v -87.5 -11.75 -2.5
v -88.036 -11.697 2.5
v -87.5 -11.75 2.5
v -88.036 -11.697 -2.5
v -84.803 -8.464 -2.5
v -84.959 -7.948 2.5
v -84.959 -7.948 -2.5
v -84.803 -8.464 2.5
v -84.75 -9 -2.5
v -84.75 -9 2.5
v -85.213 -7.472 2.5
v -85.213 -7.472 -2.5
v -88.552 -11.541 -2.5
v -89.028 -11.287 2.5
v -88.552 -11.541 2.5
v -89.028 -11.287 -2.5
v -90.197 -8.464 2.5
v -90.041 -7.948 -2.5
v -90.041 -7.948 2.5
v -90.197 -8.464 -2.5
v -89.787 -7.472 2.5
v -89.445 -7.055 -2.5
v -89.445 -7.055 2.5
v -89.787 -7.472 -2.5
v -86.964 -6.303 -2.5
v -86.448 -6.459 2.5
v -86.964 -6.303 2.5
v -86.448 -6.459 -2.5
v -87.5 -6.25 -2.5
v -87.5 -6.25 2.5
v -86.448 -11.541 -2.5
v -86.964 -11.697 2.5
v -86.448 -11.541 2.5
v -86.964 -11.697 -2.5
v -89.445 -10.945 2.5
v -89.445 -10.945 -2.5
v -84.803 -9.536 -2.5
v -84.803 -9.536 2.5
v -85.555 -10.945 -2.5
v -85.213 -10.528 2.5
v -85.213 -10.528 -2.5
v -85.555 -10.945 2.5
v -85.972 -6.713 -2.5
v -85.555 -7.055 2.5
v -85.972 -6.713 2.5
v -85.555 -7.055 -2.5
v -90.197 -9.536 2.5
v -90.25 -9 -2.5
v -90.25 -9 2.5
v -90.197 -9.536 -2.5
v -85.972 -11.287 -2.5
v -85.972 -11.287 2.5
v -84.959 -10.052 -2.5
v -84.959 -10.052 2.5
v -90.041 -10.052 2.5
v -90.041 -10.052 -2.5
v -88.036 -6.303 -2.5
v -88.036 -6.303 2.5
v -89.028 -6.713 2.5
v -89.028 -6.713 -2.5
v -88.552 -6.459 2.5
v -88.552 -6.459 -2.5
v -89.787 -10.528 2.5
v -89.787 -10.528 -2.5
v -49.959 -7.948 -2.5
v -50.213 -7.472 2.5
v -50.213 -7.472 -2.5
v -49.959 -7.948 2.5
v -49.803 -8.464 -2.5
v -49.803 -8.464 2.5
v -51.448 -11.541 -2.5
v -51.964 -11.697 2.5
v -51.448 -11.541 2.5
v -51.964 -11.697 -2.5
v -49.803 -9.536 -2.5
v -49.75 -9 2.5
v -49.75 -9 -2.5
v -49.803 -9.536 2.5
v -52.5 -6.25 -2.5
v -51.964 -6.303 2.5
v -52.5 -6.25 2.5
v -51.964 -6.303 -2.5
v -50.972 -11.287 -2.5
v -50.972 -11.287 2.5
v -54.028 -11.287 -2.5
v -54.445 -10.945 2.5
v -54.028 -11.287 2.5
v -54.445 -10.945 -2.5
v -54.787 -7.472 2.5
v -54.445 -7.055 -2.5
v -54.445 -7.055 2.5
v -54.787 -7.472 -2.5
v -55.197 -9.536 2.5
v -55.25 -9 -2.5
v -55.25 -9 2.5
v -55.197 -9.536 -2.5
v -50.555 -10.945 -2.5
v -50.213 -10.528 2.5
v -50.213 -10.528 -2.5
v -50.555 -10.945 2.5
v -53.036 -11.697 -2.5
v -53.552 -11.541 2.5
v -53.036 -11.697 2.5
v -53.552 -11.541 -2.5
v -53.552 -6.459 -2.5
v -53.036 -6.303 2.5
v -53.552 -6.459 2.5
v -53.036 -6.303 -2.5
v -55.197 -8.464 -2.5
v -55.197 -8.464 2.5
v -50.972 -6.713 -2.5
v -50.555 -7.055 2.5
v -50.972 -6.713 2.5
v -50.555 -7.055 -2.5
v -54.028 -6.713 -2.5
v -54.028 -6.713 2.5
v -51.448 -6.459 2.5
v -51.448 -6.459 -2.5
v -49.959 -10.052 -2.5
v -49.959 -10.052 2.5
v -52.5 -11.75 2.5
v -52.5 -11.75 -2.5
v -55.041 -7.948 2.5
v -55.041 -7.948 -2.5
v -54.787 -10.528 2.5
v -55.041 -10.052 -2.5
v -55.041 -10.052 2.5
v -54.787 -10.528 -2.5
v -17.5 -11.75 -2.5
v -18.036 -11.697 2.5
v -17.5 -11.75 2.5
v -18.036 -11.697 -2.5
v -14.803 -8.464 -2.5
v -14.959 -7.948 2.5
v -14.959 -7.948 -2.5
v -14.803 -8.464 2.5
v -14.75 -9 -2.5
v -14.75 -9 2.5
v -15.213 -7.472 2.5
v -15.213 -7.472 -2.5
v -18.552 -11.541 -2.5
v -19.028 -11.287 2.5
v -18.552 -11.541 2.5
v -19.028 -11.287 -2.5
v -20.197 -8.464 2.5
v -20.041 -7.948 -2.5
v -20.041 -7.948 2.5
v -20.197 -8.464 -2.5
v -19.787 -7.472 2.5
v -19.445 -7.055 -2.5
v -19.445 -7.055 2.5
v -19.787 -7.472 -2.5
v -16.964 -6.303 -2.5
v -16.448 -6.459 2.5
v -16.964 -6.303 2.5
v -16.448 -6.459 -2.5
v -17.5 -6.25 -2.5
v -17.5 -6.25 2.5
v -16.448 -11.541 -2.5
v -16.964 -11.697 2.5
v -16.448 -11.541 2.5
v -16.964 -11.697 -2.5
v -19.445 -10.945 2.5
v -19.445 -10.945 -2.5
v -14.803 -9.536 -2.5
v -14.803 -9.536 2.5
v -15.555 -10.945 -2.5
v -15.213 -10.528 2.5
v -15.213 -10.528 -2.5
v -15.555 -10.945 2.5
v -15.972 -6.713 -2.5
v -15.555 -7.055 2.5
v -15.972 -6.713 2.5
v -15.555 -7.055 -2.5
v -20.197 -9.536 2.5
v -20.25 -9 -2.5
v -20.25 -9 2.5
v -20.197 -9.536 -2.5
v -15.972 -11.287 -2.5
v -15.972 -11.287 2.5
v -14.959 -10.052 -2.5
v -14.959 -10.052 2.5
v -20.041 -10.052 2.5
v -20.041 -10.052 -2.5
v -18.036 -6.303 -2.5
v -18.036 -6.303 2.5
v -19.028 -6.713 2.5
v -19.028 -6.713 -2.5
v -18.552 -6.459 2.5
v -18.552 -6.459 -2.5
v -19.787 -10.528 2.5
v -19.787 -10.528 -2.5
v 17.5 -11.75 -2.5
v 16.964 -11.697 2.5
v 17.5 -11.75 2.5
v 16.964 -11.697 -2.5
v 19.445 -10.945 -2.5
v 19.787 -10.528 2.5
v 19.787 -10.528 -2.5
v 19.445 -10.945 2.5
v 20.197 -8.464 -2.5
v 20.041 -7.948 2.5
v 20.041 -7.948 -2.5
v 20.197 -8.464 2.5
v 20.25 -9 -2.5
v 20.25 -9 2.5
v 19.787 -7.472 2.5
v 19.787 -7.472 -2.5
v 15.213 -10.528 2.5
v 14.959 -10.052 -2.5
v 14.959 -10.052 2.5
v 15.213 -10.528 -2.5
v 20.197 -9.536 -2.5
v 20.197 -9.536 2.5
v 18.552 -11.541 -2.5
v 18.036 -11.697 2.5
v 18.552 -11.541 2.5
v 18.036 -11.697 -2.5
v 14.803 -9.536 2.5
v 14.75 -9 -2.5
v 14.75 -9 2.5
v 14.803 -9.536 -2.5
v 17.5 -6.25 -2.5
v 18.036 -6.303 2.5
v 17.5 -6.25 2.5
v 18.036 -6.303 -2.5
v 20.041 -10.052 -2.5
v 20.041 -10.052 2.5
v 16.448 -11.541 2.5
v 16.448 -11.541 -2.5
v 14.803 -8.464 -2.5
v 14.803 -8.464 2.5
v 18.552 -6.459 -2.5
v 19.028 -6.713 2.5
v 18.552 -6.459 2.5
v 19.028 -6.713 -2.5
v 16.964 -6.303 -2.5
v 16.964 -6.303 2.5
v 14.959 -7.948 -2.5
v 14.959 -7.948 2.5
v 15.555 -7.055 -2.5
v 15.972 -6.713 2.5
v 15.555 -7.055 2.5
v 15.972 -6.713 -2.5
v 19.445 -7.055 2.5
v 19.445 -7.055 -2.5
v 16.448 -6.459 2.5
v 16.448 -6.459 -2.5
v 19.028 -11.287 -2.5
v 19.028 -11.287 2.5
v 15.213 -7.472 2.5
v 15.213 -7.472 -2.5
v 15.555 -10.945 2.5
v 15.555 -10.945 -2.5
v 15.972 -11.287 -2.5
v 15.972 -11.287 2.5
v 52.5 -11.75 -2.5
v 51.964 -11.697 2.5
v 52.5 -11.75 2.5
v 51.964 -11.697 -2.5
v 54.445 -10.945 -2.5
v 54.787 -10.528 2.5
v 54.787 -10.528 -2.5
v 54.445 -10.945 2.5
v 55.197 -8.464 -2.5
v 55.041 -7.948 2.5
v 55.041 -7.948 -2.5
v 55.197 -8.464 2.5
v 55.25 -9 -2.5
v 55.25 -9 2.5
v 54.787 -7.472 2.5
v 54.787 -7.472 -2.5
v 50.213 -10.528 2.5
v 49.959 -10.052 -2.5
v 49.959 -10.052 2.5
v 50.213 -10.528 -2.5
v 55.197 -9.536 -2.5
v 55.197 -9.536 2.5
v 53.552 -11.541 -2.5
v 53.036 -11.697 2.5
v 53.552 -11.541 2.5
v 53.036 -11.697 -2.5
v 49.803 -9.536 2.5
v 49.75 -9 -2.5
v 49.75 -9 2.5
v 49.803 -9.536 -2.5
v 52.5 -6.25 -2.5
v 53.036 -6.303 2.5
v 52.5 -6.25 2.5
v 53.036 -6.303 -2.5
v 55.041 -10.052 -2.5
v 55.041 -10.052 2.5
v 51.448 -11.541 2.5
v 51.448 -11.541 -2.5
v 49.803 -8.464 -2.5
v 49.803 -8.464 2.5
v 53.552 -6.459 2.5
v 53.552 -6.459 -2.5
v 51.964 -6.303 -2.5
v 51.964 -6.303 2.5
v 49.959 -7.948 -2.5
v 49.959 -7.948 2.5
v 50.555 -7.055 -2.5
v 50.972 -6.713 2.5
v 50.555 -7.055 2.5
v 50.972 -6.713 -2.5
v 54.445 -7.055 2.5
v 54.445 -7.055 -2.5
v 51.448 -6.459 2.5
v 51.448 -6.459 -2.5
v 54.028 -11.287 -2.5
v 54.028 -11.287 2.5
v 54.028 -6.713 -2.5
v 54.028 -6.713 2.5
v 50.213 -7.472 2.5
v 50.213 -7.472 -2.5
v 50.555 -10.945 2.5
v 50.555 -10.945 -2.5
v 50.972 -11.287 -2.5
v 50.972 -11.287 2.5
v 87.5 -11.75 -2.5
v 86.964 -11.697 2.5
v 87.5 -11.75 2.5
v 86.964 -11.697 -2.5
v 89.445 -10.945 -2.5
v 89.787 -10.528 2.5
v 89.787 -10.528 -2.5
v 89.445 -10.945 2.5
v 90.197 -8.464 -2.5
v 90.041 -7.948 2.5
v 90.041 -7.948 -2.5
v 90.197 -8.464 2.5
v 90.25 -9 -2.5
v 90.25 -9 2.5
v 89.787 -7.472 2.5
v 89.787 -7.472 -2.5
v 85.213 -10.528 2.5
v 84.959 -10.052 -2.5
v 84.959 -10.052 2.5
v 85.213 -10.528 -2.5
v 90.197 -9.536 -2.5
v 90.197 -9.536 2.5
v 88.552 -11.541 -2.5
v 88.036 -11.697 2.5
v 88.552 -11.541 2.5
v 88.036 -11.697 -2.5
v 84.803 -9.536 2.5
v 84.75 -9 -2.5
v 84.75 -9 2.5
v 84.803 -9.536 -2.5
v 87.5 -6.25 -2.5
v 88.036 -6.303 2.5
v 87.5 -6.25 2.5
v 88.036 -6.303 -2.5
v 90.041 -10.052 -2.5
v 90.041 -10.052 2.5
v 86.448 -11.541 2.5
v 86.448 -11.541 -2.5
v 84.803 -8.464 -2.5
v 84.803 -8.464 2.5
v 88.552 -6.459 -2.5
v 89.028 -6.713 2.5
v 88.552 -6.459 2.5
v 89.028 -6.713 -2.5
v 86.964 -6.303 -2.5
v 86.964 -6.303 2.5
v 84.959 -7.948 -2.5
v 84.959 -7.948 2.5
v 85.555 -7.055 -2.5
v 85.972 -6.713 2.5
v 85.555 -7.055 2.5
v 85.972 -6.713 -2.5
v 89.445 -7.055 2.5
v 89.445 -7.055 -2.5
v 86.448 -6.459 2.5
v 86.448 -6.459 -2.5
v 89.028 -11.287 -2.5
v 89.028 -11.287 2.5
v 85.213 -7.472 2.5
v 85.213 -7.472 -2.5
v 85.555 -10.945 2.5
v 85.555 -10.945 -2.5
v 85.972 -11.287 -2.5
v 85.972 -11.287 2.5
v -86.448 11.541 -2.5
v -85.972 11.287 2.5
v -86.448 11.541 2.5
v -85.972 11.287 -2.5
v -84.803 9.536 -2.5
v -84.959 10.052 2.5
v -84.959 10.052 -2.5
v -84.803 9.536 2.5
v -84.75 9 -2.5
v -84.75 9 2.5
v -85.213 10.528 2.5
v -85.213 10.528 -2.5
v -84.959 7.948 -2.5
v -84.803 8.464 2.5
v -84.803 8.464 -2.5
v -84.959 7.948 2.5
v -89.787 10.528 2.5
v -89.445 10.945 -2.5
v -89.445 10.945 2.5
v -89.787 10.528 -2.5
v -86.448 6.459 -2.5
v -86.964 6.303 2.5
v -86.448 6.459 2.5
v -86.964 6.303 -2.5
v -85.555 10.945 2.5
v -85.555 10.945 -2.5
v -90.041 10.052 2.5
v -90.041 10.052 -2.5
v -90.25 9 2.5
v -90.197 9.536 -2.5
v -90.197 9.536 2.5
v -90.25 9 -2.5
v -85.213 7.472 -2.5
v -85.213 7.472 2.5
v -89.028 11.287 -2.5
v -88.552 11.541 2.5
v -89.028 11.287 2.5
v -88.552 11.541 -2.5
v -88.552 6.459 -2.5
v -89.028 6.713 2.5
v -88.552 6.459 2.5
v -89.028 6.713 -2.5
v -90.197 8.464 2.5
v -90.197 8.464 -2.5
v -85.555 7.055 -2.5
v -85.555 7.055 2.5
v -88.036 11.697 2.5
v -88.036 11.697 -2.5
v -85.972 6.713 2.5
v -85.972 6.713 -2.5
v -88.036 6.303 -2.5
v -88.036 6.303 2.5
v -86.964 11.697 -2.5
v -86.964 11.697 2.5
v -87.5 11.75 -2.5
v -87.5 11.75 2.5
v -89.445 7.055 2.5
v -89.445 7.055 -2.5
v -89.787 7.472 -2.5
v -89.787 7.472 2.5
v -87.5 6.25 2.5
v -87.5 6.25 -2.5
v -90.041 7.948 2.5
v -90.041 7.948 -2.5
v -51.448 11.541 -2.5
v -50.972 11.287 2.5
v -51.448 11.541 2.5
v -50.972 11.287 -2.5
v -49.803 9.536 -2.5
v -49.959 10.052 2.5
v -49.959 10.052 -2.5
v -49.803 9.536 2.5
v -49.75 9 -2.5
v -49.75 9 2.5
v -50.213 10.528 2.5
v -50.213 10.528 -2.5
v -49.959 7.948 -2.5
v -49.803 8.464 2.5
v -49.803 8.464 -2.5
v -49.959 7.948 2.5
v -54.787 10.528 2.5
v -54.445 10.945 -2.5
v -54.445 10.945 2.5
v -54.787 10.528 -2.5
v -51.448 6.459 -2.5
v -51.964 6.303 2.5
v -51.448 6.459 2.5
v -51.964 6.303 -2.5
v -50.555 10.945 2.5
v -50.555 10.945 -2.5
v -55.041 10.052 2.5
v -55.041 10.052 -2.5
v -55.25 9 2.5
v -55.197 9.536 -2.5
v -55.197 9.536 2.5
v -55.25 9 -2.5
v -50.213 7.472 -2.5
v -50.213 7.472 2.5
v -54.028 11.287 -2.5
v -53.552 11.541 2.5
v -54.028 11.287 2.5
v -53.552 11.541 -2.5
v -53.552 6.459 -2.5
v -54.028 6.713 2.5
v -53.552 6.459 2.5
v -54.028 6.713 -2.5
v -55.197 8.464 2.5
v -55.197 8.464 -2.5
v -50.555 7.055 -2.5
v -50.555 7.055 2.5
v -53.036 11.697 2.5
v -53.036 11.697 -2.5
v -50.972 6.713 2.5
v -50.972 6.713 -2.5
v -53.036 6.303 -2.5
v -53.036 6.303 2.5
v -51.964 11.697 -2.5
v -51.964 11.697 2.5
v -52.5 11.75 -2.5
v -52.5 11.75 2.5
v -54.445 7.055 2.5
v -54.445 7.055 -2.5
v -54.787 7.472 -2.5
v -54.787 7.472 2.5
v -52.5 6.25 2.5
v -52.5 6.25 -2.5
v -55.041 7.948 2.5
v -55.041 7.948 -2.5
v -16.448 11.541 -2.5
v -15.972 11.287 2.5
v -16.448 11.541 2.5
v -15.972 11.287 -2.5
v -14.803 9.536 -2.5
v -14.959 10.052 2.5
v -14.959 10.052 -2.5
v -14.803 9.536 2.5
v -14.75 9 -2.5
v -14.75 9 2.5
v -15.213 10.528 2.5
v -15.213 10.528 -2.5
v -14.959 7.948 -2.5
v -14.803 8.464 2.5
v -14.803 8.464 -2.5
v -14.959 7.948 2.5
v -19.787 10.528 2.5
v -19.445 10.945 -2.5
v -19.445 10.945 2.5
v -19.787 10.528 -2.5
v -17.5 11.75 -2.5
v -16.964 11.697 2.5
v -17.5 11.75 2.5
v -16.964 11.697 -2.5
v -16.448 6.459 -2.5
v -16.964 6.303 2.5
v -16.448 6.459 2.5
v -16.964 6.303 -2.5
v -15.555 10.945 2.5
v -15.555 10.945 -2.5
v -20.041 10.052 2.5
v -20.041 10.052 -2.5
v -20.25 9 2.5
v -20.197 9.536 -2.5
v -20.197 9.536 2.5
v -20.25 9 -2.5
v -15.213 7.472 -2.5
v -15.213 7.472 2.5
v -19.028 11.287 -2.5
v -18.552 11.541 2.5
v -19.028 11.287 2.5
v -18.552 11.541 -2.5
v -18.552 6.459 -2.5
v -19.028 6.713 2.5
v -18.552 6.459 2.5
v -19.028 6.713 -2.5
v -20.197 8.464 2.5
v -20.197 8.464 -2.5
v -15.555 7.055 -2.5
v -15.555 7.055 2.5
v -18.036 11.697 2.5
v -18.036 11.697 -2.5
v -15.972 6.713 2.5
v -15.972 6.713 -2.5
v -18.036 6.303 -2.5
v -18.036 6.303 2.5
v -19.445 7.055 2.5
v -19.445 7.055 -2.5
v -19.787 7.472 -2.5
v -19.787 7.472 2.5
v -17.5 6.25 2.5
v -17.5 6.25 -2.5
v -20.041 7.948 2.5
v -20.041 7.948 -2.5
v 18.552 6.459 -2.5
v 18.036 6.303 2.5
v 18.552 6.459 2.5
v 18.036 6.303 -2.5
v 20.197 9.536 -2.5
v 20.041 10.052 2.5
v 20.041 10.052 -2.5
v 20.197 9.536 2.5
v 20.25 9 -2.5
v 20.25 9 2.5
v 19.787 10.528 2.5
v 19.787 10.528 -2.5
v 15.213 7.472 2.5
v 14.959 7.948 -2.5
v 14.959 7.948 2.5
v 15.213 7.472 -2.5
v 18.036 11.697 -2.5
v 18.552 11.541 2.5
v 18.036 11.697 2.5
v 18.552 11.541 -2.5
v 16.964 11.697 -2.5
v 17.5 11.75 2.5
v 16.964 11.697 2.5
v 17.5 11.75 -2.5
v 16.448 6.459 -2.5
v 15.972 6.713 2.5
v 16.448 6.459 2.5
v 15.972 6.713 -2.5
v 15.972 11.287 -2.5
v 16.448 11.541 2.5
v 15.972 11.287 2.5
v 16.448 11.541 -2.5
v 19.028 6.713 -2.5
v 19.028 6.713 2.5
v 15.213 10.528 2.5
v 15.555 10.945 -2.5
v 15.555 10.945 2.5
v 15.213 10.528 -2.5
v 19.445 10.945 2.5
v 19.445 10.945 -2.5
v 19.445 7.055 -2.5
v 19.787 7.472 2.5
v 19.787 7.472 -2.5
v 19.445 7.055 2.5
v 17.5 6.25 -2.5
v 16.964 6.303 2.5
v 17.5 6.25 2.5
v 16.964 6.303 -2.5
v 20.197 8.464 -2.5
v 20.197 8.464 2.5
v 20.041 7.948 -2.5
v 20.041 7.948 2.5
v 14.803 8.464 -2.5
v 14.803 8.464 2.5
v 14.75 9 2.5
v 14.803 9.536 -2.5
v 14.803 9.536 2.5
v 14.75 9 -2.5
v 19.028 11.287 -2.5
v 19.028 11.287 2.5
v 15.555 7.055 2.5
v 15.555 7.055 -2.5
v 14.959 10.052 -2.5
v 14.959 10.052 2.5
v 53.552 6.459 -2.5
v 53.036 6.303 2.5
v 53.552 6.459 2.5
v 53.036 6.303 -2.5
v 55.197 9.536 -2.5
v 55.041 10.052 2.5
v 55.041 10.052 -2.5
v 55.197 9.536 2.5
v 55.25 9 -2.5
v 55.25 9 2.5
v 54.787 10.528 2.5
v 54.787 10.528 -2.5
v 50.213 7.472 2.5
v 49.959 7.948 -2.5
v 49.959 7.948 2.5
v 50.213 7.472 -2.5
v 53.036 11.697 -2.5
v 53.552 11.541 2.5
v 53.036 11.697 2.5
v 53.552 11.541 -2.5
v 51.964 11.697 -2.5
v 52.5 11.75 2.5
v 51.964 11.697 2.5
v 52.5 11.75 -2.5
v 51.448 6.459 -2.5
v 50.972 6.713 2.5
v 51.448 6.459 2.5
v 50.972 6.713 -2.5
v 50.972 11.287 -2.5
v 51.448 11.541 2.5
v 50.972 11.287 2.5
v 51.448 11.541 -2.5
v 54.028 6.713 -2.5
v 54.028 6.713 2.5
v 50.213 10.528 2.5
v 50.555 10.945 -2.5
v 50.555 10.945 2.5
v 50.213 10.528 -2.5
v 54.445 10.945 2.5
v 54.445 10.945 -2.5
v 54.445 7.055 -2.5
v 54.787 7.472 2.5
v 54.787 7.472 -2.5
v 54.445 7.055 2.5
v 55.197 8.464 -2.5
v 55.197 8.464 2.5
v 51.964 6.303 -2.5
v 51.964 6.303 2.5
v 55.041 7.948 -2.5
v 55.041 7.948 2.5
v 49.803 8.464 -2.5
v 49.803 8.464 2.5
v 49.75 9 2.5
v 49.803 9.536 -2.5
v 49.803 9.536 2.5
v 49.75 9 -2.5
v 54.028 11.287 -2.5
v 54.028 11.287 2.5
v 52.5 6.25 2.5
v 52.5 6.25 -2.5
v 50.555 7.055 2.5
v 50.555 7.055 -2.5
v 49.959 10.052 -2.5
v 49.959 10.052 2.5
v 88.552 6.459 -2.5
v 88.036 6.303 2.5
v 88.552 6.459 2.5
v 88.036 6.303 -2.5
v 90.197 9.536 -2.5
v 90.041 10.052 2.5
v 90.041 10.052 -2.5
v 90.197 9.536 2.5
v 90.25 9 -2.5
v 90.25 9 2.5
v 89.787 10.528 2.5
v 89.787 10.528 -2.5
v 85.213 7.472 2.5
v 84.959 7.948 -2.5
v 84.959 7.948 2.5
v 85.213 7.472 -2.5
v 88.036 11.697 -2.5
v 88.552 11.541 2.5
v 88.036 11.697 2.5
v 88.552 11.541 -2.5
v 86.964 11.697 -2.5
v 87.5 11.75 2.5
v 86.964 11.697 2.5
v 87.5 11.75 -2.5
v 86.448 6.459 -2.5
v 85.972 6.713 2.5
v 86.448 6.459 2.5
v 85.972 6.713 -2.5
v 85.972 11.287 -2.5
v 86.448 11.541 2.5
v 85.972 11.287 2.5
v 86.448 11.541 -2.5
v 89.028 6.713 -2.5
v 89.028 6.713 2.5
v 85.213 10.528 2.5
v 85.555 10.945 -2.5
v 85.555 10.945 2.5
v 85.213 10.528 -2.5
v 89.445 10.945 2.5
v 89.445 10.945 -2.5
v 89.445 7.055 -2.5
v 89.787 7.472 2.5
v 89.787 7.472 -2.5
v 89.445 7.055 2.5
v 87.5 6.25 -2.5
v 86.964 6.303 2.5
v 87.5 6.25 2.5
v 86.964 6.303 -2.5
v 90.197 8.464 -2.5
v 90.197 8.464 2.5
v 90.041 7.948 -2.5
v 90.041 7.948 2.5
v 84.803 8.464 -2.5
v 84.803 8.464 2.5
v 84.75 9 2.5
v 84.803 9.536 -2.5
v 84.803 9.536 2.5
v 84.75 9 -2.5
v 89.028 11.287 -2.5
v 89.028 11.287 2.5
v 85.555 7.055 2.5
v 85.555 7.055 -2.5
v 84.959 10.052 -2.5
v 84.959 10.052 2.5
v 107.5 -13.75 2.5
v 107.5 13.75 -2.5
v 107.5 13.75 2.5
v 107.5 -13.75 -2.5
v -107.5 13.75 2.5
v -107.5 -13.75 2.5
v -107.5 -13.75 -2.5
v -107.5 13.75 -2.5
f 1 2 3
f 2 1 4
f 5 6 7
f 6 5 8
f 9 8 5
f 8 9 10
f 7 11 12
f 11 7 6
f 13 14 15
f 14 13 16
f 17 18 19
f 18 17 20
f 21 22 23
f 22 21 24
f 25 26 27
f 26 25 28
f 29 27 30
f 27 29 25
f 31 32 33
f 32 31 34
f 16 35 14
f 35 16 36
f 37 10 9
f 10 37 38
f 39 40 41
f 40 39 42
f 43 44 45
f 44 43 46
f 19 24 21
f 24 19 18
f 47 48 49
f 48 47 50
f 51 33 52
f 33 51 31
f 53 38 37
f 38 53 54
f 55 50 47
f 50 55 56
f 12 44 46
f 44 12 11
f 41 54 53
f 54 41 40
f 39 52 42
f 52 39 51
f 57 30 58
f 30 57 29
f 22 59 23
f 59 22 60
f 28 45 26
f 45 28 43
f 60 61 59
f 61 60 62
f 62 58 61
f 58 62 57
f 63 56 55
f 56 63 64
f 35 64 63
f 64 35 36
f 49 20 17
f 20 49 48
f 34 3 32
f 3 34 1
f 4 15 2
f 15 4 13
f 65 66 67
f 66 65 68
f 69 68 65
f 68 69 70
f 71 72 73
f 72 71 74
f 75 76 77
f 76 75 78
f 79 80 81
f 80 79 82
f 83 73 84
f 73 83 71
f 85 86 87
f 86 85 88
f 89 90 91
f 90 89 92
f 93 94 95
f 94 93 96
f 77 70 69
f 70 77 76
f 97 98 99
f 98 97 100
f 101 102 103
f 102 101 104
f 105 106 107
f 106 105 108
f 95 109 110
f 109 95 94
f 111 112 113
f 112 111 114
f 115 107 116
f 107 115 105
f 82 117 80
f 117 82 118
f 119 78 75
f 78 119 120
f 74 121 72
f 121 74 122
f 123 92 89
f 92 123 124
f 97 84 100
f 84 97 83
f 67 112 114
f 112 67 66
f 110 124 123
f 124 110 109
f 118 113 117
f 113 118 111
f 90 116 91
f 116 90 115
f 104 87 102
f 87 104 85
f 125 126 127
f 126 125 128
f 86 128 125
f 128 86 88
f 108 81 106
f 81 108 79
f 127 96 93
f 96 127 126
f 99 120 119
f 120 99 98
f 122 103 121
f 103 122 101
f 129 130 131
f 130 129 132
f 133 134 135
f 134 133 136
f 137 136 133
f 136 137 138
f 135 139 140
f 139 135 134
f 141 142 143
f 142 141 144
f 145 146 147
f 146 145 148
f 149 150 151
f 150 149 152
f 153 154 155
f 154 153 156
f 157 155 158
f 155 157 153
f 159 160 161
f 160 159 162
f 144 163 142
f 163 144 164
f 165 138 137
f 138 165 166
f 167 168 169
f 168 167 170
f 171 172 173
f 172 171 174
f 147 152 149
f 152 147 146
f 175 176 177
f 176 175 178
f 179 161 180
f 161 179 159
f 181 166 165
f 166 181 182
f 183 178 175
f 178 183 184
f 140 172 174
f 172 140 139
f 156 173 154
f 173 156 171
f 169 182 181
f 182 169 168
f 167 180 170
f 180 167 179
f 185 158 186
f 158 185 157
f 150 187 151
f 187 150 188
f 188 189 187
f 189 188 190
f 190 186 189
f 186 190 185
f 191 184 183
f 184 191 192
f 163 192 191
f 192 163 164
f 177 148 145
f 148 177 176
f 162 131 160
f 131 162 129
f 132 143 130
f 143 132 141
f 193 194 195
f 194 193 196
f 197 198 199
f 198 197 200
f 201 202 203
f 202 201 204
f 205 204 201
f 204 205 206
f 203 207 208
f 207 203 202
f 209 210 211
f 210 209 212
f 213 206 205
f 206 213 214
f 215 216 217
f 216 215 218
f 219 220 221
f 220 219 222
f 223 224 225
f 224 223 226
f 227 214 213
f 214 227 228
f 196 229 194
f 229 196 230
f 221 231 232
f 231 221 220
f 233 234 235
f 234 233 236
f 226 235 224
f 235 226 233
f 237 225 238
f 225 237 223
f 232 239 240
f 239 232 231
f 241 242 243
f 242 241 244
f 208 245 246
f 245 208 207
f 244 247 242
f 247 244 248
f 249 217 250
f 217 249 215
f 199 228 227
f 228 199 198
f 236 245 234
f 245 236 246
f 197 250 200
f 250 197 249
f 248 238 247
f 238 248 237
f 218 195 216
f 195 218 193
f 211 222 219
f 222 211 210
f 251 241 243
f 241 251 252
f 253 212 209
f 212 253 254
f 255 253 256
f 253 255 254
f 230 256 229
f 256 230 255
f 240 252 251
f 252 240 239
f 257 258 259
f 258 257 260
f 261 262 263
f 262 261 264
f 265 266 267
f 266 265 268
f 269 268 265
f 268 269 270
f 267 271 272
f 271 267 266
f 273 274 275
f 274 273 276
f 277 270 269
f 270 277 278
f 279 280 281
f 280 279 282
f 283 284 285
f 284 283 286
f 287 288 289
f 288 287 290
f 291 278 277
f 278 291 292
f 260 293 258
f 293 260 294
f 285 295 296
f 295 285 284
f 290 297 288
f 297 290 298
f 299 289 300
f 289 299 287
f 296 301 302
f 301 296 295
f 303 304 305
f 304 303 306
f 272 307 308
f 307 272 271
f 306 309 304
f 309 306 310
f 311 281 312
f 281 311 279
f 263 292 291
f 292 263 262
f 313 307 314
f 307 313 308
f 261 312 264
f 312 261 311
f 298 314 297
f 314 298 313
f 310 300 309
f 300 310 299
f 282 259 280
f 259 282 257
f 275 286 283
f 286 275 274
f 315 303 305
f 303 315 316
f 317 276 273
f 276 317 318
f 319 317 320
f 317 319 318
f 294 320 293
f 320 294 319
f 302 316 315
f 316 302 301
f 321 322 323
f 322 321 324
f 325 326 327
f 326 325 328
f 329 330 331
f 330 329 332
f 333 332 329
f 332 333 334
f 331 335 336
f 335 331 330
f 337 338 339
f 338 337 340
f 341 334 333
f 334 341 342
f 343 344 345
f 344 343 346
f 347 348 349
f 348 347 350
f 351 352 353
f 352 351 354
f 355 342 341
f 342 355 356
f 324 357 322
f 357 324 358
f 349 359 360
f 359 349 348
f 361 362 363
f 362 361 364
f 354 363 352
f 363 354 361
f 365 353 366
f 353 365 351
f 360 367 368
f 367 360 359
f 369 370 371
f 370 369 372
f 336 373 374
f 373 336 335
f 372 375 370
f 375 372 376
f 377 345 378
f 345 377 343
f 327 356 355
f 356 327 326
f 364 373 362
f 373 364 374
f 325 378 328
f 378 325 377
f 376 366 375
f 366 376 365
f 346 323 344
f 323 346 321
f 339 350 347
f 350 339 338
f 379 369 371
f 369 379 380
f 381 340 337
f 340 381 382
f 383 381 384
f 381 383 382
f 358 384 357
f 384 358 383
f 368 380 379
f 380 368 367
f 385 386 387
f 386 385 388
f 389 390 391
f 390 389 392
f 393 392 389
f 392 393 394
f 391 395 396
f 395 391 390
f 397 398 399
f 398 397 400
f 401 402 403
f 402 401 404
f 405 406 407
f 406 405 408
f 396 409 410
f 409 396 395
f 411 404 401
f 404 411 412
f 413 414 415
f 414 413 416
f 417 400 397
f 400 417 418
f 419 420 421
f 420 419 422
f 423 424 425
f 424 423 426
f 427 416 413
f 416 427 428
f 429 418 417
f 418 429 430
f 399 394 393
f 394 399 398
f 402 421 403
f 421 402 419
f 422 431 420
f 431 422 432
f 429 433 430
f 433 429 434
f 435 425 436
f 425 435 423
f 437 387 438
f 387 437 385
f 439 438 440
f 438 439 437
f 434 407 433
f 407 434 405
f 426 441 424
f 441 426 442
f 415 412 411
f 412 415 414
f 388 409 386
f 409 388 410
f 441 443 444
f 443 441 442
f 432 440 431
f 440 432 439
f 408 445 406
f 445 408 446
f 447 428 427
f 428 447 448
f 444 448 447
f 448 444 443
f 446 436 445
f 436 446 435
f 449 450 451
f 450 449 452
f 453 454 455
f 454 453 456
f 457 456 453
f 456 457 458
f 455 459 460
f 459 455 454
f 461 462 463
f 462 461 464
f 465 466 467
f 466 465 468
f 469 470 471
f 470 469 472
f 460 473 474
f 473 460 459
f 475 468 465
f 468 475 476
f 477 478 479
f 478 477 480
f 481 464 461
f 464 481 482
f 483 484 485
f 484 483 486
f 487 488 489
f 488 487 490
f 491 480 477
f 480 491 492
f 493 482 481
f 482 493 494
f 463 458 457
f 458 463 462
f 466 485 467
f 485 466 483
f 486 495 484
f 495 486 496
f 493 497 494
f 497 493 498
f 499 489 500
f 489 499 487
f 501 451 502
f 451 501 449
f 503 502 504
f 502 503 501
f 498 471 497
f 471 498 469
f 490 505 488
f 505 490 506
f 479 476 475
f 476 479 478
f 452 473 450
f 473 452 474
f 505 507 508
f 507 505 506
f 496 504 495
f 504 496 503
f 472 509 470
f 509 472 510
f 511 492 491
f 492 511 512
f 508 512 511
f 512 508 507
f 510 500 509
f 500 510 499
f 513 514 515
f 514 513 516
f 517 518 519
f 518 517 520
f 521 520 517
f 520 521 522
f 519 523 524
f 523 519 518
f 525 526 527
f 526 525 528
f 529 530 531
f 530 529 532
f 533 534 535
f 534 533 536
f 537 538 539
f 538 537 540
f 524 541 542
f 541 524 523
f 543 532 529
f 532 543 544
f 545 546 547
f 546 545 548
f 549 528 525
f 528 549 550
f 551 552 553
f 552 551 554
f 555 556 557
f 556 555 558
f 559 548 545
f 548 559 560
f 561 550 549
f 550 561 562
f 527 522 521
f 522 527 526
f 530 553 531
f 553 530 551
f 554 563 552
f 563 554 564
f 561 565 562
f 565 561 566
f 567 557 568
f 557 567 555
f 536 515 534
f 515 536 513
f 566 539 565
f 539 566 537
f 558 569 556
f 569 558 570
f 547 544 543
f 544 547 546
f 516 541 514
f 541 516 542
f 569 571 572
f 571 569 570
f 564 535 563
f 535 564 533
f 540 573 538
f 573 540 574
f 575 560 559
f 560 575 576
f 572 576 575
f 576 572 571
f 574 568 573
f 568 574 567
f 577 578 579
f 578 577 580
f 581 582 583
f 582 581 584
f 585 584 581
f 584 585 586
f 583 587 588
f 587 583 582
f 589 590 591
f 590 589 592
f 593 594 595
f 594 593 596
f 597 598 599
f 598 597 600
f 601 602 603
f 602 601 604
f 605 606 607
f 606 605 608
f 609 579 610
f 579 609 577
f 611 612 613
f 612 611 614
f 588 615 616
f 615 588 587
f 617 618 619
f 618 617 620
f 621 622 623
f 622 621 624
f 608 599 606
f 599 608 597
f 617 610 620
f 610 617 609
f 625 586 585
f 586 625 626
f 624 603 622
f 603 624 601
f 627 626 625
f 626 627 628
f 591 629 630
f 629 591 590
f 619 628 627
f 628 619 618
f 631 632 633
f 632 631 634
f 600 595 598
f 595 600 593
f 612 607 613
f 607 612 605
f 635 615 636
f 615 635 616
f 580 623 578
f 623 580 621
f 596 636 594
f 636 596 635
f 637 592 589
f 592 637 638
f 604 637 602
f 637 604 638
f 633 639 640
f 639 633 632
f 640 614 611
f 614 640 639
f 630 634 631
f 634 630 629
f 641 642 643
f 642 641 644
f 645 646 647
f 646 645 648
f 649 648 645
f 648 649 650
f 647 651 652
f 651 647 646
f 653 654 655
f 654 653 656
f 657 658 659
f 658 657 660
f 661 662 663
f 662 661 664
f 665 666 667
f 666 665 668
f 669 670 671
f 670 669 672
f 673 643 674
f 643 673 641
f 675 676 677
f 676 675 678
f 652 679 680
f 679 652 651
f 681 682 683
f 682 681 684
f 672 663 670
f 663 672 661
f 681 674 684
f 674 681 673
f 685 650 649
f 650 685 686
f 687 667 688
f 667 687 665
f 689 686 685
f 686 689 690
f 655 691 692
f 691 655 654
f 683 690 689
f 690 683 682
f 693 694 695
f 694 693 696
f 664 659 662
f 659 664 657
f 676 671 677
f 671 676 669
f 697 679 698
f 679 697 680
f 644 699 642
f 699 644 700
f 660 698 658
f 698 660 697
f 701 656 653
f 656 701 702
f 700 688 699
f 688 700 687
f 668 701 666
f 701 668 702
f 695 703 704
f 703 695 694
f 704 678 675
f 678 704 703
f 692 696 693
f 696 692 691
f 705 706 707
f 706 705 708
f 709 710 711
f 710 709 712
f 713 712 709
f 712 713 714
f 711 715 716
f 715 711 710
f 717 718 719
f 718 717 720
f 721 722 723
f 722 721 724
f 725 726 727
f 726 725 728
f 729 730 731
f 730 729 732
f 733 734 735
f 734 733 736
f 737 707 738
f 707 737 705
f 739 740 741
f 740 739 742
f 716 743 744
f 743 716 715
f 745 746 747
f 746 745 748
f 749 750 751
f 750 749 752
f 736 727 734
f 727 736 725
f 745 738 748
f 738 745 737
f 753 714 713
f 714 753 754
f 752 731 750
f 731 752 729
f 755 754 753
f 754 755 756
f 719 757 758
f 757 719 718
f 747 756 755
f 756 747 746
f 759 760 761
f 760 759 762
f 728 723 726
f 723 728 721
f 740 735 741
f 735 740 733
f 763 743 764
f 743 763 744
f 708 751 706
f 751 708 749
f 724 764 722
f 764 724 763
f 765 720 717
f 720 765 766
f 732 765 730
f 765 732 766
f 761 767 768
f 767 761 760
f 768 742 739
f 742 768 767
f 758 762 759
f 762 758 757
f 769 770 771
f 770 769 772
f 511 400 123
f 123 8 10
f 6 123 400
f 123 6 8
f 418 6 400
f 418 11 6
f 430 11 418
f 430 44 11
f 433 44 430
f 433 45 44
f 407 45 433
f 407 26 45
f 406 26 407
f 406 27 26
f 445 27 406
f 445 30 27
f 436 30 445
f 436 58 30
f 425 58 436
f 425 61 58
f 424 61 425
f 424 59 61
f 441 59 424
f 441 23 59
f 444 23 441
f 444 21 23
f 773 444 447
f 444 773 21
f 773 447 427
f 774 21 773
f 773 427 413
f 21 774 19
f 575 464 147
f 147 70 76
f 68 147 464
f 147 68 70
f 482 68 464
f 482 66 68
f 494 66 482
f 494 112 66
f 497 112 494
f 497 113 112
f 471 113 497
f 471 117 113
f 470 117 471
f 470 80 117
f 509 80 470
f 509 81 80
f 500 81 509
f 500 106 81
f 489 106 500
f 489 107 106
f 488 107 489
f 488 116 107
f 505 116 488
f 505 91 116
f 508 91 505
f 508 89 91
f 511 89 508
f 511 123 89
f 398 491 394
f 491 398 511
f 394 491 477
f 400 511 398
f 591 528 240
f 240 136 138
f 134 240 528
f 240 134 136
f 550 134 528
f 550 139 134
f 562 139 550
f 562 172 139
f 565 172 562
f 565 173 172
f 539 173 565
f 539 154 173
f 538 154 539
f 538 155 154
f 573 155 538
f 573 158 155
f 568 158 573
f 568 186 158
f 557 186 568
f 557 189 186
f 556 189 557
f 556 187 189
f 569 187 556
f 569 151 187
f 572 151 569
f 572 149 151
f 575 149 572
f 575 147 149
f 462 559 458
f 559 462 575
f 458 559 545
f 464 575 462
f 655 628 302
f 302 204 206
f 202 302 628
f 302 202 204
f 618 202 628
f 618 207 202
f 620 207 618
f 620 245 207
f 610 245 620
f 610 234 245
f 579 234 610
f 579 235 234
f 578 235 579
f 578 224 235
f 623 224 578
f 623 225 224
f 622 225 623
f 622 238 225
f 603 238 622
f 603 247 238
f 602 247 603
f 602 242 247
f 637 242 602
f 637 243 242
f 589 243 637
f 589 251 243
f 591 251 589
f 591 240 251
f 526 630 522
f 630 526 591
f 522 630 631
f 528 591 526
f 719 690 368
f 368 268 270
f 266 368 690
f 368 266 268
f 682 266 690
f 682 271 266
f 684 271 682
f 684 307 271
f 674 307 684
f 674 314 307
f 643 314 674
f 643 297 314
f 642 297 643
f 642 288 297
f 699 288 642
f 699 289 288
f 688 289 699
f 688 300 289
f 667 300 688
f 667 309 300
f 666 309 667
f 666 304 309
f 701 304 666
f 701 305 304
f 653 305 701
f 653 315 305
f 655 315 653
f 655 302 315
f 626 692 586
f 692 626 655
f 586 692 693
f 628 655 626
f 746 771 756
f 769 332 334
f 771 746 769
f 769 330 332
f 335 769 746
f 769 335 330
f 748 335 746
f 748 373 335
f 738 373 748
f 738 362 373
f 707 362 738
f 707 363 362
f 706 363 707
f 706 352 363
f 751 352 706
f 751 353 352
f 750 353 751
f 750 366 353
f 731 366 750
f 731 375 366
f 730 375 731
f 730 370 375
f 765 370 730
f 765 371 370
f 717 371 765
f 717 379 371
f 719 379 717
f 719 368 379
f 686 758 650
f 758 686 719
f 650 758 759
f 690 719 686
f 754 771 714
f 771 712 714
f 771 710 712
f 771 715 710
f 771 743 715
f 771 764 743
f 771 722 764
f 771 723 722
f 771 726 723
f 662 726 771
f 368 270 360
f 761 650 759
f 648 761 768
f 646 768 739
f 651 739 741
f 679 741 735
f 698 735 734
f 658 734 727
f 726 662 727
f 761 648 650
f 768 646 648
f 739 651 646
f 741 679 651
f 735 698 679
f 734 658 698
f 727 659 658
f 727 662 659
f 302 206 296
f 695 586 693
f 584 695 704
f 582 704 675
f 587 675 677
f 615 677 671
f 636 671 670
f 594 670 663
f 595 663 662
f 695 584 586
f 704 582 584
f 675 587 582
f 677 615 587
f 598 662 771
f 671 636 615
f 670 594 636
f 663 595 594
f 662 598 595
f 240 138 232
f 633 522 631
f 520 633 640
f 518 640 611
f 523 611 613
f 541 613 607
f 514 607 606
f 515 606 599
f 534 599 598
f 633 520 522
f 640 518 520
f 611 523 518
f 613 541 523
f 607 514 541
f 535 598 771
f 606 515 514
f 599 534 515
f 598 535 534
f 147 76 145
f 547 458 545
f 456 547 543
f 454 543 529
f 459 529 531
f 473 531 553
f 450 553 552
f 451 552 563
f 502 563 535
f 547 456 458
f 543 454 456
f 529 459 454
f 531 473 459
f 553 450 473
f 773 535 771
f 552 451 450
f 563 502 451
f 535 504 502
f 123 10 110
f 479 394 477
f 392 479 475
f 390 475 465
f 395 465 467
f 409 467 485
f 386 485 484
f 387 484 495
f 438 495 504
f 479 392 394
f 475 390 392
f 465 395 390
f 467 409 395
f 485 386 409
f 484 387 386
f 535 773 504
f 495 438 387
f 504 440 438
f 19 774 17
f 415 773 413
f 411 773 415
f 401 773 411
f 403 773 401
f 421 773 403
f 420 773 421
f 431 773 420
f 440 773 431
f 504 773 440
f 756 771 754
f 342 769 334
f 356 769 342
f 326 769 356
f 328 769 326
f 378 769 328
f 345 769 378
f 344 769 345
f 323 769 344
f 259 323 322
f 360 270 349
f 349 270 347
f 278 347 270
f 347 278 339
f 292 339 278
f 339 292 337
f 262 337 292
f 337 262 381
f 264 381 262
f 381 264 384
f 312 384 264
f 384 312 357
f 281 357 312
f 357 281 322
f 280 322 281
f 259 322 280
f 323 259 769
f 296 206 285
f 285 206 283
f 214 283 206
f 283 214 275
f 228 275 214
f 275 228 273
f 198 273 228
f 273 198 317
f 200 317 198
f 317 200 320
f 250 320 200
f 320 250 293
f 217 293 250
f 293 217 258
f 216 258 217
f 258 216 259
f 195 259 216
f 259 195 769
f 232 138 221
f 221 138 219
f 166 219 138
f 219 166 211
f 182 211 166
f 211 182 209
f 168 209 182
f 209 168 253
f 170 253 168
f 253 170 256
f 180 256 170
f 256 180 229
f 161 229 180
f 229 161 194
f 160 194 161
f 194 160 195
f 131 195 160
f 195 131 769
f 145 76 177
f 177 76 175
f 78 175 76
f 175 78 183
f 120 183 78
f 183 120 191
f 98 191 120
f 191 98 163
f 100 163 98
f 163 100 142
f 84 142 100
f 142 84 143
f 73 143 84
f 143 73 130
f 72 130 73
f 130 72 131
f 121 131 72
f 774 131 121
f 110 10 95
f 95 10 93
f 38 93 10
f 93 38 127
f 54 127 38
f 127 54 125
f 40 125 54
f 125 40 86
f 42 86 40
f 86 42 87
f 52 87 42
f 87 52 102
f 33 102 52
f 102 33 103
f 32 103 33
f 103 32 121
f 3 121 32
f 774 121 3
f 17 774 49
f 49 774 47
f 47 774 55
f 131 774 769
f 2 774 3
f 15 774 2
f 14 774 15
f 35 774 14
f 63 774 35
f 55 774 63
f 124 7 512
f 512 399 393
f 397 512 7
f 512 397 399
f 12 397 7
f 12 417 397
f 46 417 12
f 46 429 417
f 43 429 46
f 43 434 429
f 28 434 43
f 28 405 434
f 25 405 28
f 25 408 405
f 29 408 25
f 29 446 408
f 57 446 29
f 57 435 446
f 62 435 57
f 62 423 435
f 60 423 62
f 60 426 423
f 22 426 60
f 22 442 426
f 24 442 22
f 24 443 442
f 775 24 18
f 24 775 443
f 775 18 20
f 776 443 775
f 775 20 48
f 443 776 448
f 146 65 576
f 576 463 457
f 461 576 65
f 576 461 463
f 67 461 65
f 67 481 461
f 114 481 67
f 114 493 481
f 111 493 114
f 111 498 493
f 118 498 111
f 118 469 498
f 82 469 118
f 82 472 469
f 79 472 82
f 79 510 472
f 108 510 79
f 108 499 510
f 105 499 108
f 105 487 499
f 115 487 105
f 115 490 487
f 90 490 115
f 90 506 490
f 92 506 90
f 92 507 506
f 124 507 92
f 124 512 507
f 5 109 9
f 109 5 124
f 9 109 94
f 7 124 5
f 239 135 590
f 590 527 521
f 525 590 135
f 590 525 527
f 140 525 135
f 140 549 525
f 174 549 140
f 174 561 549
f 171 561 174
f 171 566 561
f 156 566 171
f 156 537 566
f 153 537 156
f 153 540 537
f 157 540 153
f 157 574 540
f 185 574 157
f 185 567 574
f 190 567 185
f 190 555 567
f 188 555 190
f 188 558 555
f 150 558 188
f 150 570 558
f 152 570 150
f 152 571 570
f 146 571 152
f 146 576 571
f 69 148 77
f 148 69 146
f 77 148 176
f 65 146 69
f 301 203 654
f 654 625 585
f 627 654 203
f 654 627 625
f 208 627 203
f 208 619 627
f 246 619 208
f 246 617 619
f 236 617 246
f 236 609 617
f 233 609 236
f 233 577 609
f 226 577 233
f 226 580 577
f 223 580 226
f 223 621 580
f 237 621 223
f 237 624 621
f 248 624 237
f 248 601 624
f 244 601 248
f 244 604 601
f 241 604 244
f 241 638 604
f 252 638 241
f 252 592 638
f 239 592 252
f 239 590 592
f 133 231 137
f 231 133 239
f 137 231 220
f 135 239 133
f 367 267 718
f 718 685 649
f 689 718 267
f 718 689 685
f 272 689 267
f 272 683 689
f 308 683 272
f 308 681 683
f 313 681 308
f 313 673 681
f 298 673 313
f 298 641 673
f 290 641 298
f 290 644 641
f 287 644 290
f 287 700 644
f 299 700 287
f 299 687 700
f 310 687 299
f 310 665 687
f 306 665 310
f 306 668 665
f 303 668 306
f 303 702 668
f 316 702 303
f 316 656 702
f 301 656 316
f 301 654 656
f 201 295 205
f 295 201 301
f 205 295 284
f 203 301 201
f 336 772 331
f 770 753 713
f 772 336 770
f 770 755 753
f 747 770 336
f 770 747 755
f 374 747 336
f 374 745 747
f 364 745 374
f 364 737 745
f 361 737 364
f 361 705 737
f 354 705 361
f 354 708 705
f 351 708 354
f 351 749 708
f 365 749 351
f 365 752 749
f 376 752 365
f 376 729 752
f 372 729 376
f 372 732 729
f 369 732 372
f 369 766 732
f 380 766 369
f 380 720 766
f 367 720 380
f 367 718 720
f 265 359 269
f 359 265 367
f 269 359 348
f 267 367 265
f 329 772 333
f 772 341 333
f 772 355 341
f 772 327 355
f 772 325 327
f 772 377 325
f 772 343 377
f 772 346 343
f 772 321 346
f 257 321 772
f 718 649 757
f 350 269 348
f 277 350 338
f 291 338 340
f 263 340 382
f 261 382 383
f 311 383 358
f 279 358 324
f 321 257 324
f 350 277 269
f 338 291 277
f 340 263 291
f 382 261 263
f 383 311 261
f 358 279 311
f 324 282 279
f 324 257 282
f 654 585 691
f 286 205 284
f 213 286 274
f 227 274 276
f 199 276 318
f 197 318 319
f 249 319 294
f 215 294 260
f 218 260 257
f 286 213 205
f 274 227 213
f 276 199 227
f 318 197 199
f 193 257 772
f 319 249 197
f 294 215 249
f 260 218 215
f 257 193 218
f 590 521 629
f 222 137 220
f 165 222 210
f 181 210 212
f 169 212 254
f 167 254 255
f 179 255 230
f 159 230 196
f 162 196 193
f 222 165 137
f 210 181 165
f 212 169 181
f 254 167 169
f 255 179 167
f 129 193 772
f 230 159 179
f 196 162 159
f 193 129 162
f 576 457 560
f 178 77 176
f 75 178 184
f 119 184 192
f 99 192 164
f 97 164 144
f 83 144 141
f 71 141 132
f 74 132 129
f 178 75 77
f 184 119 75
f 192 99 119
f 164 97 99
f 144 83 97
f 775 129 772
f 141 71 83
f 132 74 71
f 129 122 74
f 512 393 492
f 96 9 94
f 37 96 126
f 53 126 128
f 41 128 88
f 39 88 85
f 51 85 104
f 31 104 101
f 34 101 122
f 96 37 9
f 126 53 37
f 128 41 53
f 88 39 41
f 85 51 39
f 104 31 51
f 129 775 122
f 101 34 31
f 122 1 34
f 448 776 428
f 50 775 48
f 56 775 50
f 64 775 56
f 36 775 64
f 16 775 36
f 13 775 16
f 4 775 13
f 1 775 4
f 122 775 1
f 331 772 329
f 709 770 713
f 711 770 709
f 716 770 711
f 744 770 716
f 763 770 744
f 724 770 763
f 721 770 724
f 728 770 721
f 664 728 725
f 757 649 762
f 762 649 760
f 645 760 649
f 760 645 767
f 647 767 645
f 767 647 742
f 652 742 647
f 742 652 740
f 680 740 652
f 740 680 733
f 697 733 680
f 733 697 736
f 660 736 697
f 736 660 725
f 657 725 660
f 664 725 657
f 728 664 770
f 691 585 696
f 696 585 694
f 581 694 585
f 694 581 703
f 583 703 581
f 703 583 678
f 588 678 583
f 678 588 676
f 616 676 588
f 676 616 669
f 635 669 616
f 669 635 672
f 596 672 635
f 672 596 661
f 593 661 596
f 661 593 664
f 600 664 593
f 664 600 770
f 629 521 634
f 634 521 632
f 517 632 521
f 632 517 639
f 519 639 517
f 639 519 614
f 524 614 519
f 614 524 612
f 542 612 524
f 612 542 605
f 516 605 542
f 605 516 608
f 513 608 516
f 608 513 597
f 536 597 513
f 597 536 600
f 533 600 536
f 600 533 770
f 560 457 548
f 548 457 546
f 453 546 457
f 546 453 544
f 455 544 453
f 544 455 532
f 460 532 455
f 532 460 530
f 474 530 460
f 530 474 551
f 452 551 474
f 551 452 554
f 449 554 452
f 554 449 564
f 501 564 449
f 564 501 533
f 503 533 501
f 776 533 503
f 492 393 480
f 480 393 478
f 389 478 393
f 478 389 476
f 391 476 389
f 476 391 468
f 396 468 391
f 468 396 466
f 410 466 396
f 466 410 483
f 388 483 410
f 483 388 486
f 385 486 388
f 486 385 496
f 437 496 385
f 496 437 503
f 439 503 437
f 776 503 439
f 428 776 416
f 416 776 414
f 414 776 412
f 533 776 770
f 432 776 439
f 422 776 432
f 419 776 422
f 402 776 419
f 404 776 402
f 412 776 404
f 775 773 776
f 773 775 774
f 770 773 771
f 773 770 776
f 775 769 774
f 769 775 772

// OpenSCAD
$fn = 32;

// ----------------------------------------------------------------------
// Hole bar, 6 x Ø5.5
// tworows layout, 20 mm edge offset
// ----------------------------------------------------------------------

// --- parameters (mm) ---
bar_w = 27.5;     // bar width (Y)
bar_t = 5;        // bar thickness (Z)
holes = 6;        // holes per row
hole_d = 5.5;     // hole diameter
edge = 20;        // offset from the bar end to the first hole
pitch = 35;       // pitch between neighbouring holes
row_offset = 18;  // distance between the two rows

// --- derived feature positions (mm) ---
span = (holes - 1) * pitch;   // = 175   distance between the end holes
bar_l = span + 2 * edge;      // = 215   overall bar length
start_x = -bar_l / 2 + edge;  // = -87.5   X of the first hole
feature_centers = [
  [start_x + 0 * pitch, -row_offset / 2],
  [start_x + 1 * pitch, -row_offset / 2],
  [start_x + 2 * pitch, -row_offset / 2],
  [start_x + 3 * pitch, -row_offset / 2],
  [start_x + 4 * pitch, -row_offset / 2],
  [start_x + 5 * pitch, -row_offset / 2]
];   // hole centres of the first row
row2_centers = [
  [start_x + 0 * pitch, row_offset / 2],
  [start_x + 1 * pitch, row_offset / 2],
  [start_x + 2 * pitch, row_offset / 2],
  [start_x + 3 * pitch, row_offset / 2],
  [start_x + 4 * pitch, row_offset / 2],
  [start_x + 5 * pitch, row_offset / 2]
];   // hole centres of the second row

// bar with two rows of holes, both read from their own centre arrays
difference() {
  translate([-bar_l / 2, -bar_w / 2, -bar_t / 2]) cube([bar_l, bar_w, bar_t]);
  for (centre = feature_centers)
    translate([centre[0], centre[1], 0])
      cylinder(d = hole_d, h = bar_t + 2, center = true);
  for (centre = row2_centers)
    translate([centre[0], centre[1], 0])
      cylinder(d = hole_d, h = bar_t + 2, center = true);
}
